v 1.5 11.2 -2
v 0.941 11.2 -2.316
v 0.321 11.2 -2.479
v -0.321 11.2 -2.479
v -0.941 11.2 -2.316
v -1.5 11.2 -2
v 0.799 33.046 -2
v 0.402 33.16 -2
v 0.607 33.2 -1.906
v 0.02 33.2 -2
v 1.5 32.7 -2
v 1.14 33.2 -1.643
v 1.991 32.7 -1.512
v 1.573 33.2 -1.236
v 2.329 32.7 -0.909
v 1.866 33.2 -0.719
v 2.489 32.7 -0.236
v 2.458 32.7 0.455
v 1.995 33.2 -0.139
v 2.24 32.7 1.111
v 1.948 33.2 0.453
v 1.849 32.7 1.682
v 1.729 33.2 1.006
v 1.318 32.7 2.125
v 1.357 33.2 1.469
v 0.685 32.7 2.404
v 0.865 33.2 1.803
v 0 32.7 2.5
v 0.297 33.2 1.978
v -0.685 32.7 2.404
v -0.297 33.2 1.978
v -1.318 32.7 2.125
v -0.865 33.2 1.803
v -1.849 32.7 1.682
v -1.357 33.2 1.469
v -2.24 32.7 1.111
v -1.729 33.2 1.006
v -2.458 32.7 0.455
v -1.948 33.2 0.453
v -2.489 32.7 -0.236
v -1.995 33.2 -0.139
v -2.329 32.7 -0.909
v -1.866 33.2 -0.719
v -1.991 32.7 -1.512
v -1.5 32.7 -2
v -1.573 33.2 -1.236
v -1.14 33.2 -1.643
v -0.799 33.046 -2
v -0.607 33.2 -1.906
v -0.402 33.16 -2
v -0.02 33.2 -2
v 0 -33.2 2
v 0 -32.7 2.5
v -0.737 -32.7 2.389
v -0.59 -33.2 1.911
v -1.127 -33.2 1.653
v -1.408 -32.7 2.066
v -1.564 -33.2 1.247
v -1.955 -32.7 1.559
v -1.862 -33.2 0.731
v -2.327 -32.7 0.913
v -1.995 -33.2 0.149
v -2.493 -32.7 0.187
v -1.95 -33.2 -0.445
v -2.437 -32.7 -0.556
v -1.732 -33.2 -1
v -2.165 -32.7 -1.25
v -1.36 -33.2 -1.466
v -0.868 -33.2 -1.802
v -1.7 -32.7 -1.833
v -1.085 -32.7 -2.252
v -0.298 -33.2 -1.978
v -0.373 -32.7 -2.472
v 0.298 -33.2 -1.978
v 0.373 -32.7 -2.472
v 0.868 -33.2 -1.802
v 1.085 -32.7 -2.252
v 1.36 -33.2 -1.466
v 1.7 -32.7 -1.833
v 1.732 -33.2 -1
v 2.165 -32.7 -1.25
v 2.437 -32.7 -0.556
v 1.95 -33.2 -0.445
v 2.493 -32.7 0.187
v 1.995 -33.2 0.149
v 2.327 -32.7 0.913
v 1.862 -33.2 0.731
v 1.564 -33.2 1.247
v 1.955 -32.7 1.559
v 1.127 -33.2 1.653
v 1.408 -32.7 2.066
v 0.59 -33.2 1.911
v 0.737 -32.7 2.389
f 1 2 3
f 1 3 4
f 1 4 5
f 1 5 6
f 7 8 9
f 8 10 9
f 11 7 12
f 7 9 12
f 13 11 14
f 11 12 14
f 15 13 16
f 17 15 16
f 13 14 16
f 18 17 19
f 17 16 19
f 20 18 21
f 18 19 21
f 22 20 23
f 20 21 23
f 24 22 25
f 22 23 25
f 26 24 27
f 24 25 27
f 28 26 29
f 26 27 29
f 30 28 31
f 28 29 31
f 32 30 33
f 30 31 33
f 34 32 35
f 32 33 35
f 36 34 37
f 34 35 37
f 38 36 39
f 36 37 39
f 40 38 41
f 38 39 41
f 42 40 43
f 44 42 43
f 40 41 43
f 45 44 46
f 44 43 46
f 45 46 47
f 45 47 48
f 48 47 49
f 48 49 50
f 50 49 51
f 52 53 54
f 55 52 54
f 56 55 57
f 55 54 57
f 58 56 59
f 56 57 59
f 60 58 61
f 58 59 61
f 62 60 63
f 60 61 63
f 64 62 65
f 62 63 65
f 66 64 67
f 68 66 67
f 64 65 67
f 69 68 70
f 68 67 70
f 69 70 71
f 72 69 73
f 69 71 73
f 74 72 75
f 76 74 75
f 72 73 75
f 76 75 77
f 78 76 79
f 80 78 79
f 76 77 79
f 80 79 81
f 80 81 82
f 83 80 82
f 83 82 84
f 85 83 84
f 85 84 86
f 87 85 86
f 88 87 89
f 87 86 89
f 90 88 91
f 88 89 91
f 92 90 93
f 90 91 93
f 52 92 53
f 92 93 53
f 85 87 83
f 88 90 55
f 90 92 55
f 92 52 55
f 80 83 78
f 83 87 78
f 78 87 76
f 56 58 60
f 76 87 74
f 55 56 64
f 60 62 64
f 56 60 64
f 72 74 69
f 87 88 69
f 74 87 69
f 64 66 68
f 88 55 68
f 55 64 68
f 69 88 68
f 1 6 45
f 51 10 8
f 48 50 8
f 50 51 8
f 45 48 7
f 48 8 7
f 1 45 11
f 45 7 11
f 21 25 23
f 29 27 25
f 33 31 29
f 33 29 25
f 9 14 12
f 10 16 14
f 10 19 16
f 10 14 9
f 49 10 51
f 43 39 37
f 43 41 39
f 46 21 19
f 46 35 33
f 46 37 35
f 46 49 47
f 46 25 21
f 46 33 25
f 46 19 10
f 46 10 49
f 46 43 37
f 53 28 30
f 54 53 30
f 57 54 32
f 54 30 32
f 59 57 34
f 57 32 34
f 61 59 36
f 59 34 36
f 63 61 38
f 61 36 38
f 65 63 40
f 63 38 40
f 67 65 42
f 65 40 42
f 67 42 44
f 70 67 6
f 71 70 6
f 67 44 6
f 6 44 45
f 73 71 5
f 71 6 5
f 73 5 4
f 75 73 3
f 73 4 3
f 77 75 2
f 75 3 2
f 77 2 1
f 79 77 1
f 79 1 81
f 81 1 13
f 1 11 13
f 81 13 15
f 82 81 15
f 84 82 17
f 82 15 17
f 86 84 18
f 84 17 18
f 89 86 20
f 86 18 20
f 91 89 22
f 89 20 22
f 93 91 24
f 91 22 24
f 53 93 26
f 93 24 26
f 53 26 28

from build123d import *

# Parameters (mm, degrees)
SKETCH3_W             = 2.5
SKETCH3_H             = 66.4
CORTE_EXTRUS_O1_DEPTH = 22
CHANFRO1_SIZE         = 0.5


with BuildPart() as part:
    # Sketch3 → Revolve2 (revolve)
    with BuildSketch(Plane(origin=(0, 0, 0), x_dir=(0, 0, -1), z_dir=(1, 0, 0)), mode=Mode.PRIVATE) as revolve2_sk:
        with Locations((1.25, 0)):
            Rectangle(SKETCH3_W, SKETCH3_H)
    revolve(revolve2_sk.sketch.rotate(Axis((0, 33.2, 0), (0, -1, 0)), 180), axis=Axis((0, 33.2, 0), (0, -1, 0)))

    # Esboço1 → Corte-extrusão1 (cut)
    with BuildSketch(Plane(origin=(0, 33.2, 0), x_dir=(1, 0, 0), z_dir=(0, 1, 0))):
        with BuildLine():
            Line((-1.5, 2), (1.5, 2))
            ThreePointArc((1.5, 2), (0, 2.5), (-1.5, 2))
        make_face()
    extrude(amount=-CORTE_EXTRUS_O1_DEPTH, mode=Mode.SUBTRACT)

    # Chanfro1
    chanfro1_edges = [part.edges().sort_by_distance(p)[0] for p in [
        (0, -33.2, -2.5),
        (2.371708245, 33.2, 0.790569415),
    ]]
    chamfer(chanfro1_edges, length=CHANFRO1_SIZE - 0.0001)  # a hair under: the kernel refuses the full size


solid = part.part
